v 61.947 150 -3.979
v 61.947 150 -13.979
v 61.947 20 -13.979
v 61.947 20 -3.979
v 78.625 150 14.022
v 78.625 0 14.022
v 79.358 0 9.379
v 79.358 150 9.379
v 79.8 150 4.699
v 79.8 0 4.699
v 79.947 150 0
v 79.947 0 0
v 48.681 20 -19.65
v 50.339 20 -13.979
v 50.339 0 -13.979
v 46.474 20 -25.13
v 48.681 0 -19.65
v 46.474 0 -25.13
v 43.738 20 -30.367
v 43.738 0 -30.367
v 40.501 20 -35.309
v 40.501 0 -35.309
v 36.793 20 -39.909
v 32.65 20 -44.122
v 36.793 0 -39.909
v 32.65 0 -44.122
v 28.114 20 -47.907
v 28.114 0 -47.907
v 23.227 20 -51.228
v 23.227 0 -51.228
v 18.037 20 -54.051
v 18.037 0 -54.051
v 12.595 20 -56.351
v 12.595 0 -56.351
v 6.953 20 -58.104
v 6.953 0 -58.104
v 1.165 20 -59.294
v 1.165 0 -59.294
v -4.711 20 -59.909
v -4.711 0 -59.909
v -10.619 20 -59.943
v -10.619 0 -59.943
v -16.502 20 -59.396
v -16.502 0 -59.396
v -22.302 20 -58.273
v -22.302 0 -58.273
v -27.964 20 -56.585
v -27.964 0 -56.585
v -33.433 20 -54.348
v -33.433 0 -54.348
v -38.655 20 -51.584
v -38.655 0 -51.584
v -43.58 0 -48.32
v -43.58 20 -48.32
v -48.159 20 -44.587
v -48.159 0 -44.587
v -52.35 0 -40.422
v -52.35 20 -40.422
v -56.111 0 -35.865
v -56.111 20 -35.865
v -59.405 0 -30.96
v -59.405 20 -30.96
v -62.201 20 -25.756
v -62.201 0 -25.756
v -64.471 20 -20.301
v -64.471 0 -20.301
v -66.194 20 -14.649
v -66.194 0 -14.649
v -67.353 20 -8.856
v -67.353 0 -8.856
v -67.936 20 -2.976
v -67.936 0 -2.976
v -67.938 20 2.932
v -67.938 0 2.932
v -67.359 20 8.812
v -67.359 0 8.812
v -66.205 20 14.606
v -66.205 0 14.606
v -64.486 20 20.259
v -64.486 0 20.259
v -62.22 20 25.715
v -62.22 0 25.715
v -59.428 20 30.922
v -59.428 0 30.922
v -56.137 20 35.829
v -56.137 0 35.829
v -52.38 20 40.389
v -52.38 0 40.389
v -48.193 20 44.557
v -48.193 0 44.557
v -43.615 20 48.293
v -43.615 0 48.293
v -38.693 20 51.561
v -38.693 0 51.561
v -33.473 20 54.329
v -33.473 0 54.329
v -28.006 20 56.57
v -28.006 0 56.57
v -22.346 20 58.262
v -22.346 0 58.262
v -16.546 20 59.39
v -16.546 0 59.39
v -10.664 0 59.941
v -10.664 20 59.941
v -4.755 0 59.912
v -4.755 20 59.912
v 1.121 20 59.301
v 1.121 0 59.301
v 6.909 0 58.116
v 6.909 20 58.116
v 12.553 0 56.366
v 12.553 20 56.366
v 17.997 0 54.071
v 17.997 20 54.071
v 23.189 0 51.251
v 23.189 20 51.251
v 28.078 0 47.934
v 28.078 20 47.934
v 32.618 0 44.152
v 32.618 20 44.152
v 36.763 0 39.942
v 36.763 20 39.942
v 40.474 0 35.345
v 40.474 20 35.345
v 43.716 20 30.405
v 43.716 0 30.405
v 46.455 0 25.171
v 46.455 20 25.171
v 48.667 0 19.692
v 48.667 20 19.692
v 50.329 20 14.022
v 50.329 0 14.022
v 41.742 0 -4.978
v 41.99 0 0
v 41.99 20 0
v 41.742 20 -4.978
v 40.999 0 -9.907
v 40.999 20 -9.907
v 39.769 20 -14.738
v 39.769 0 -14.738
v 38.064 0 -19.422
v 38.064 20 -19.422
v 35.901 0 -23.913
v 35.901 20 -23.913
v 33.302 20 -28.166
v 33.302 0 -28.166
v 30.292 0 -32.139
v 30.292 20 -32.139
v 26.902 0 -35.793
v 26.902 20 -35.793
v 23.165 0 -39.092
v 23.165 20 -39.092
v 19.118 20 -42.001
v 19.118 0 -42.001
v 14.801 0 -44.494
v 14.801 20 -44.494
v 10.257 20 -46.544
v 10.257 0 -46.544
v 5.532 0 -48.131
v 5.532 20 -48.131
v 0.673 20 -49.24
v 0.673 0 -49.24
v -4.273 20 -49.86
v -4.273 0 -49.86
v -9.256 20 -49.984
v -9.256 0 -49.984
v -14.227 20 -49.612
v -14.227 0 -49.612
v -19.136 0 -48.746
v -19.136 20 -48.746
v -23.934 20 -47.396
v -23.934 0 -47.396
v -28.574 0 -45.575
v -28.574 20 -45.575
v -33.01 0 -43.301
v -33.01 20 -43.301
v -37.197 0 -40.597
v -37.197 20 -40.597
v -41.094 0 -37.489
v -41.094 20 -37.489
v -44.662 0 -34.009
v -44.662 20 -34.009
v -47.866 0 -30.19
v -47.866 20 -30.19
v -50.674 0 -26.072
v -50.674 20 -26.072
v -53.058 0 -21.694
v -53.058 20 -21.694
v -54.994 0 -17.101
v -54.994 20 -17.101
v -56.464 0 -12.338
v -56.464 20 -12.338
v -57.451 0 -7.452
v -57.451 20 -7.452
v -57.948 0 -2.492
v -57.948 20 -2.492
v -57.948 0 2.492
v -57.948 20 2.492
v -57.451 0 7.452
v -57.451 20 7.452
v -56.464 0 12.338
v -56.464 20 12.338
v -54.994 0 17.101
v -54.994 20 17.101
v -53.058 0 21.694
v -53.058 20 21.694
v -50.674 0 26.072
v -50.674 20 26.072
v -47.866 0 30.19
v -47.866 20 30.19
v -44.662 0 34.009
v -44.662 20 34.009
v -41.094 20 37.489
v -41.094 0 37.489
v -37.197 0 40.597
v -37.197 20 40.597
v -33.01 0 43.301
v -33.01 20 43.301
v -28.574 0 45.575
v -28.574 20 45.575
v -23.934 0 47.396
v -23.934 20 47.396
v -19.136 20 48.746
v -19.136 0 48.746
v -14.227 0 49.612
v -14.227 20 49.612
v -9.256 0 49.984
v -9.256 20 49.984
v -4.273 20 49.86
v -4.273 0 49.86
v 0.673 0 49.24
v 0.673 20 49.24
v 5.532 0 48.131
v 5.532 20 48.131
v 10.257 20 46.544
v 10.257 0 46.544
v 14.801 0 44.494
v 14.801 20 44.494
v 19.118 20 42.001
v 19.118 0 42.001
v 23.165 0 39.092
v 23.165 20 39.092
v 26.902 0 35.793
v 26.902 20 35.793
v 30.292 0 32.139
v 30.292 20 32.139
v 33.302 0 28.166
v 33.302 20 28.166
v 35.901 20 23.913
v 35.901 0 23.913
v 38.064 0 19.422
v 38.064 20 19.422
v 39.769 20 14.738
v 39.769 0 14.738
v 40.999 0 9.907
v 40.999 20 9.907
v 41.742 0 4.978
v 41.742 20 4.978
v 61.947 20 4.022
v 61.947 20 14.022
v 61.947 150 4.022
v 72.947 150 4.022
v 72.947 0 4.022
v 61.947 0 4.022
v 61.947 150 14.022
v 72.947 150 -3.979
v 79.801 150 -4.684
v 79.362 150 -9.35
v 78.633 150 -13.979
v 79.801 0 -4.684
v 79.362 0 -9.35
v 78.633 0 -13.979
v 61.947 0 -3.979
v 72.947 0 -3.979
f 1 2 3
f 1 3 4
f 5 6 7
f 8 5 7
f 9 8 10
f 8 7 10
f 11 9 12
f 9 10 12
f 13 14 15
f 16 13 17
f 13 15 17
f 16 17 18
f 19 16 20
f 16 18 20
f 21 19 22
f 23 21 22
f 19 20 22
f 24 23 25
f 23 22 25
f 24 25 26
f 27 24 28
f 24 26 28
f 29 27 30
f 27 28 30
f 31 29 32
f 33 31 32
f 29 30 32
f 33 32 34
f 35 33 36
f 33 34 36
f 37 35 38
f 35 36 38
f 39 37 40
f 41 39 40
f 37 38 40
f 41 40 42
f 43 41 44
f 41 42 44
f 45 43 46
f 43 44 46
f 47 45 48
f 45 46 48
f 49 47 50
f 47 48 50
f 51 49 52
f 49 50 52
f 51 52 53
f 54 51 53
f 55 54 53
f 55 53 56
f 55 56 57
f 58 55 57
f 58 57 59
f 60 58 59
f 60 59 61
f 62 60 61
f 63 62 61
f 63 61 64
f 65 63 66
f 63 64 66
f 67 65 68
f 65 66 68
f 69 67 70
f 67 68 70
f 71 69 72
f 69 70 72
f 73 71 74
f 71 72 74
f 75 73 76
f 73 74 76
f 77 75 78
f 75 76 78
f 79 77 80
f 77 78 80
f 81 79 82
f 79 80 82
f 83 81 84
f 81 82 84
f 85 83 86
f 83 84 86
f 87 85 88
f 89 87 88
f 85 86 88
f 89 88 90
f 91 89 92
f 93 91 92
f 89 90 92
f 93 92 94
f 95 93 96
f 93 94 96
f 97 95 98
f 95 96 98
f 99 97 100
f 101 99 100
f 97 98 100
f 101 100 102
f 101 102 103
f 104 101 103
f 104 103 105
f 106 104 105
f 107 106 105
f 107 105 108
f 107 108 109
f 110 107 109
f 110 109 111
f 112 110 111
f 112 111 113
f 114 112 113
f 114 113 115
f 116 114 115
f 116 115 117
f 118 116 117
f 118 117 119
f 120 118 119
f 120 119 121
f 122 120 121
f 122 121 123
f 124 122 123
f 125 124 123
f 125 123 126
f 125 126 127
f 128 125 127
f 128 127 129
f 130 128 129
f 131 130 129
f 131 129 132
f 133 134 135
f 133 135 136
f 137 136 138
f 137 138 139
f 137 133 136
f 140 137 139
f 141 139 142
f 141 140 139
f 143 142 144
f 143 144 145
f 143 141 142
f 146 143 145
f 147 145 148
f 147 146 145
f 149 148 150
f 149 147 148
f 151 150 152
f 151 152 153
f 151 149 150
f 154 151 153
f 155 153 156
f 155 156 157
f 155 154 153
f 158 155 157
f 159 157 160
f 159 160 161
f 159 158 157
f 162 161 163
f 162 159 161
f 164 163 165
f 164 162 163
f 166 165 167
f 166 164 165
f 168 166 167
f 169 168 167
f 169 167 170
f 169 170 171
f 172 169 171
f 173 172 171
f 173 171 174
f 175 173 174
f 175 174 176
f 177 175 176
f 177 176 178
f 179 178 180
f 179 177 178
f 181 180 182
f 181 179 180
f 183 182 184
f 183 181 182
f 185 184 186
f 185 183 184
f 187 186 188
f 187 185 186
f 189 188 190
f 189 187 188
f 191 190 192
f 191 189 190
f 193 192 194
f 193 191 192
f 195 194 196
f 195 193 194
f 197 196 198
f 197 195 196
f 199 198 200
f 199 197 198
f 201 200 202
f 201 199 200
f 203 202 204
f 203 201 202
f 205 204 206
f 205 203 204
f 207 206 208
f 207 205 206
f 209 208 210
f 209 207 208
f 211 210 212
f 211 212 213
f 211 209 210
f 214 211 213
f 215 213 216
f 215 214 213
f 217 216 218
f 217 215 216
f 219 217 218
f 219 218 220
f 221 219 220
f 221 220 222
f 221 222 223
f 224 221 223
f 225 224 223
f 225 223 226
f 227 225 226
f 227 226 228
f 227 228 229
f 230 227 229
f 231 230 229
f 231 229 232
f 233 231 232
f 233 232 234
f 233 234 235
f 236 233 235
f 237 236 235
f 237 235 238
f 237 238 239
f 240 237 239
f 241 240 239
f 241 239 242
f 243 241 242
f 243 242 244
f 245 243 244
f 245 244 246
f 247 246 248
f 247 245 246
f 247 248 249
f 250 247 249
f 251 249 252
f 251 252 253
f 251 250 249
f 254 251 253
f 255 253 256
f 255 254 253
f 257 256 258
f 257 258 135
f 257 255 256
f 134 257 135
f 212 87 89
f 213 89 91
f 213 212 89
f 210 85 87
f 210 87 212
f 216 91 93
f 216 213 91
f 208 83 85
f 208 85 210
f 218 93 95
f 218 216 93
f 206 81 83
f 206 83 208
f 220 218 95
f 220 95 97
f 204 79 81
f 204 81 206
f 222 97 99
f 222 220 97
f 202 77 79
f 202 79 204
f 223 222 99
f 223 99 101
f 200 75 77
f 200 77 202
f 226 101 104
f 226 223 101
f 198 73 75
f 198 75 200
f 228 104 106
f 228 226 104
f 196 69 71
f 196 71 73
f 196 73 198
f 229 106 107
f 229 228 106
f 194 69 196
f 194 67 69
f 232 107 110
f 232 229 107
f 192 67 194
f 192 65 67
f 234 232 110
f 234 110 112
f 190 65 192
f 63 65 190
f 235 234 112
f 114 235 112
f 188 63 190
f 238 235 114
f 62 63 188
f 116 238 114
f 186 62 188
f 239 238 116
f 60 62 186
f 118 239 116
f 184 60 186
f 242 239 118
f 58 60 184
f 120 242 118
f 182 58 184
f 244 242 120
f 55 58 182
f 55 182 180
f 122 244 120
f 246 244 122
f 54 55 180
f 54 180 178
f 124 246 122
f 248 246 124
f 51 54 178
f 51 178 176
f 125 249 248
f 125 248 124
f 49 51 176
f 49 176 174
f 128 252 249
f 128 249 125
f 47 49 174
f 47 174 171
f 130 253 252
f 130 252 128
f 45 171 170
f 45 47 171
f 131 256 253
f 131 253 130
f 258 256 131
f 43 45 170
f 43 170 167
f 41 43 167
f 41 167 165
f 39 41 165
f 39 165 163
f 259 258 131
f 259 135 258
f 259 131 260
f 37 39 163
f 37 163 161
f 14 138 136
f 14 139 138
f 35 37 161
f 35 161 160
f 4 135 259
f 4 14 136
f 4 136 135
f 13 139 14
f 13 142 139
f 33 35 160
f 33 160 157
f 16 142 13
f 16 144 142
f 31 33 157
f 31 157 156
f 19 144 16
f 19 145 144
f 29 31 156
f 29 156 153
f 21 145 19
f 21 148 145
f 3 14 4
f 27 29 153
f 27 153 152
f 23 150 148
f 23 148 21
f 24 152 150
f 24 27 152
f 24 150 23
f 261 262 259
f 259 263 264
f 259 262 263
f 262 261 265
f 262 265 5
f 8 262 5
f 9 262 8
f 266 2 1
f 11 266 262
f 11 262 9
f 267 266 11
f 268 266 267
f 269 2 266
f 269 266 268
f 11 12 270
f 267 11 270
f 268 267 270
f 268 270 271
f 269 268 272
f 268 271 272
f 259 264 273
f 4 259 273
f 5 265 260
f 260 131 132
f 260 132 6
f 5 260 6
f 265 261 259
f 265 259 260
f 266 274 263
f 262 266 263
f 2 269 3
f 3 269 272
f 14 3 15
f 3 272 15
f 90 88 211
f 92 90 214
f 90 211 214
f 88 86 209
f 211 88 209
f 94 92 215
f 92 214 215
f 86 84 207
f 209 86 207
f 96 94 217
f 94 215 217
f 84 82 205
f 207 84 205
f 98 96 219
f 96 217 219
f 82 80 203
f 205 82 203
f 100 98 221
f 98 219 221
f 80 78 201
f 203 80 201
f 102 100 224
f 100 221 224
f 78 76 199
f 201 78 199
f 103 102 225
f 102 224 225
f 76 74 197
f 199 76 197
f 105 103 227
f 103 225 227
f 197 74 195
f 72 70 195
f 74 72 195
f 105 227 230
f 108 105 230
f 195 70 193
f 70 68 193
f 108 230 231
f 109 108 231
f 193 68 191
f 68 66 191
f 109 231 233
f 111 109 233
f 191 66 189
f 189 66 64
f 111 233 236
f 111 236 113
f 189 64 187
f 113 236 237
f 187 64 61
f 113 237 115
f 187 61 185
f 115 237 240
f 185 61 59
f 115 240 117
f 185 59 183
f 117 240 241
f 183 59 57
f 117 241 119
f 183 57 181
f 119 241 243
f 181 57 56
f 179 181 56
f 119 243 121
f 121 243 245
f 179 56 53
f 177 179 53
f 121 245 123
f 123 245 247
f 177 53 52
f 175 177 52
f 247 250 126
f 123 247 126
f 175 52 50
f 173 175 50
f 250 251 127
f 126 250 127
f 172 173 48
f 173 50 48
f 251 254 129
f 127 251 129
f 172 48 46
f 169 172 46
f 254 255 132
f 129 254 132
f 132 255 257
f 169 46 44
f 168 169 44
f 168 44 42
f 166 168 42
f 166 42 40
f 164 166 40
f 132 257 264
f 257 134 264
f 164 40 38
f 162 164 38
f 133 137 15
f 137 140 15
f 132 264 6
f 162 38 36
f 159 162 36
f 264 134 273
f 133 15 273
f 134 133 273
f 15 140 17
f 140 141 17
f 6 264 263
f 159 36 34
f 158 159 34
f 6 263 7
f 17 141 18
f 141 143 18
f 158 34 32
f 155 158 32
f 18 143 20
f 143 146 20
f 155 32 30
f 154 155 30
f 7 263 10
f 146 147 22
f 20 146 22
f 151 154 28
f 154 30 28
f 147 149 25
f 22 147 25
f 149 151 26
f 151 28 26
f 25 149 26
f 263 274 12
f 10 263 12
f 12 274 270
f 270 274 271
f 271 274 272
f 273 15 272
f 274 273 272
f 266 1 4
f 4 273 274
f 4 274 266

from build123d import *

# Parameters (mm, degrees)
SKETCH1_R           = 50
BOSS_EXTRUDE1_DEPTH = 20
BOSS_EXTRUDE2_DEPTH = 150


with BuildPart() as part:
    # Sketch1 → Boss-Extrude1 (new body)
    with BuildSketch(Plane(origin=(0, 0, 0), x_dir=(1, 0, 0), z_dir=(0, 1, 0))):
        with BuildLine():
            ThreePointArc((50.339164764, 13.978703751), (-68.009745742, 0.022314378), (50.328751088, -14.02210054))
            Line((50.328751088, -14.02210054), (61.947059133, -14.02210054))
            Line((61.947059133, -14.02210054), (61.947059133, 13.978703751))
            Line((61.947059133, 13.978703751), (50.339164764, 13.978703751))
        make_face()
        with Locations((-8.009749891, 0)):
            Circle(SKETCH1_R, mode=Mode.SUBTRACT)
    extrude(amount=BOSS_EXTRUDE1_DEPTH)

    # Sketch1<4> → Boss-Extrude2 (add)
    with BuildSketch(Plane(origin=(0, 0, 0), x_dir=(1, 0, 0), z_dir=(0, 1, 0))):
        with BuildLine():
            Line((72.947059133, 3.978703751), (72.947059133, -4.02210054))
            Line((72.947059133, -4.02210054), (61.947059133, -4.02210054))
            Line((61.947059133, -4.02210054), (61.947059133, -14.02210054))
            Line((61.947059133, -14.02210054), (78.624604535, -14.02210054))
            ThreePointArc((78.624604535, -14.02210054), (79.947055881, -0.022086627), (78.632850446, 13.978703751))
            Line((78.632850446, 13.978703751), (61.947059133, 13.978703751))
            Line((61.947059133, 13.978703751), (61.947059133, 3.978703751))
            Line((61.947059133, 3.978703751), (72.947059133, 3.978703751))
        make_face()
    extrude(amount=BOSS_EXTRUDE2_DEPTH)


solid = part.part
